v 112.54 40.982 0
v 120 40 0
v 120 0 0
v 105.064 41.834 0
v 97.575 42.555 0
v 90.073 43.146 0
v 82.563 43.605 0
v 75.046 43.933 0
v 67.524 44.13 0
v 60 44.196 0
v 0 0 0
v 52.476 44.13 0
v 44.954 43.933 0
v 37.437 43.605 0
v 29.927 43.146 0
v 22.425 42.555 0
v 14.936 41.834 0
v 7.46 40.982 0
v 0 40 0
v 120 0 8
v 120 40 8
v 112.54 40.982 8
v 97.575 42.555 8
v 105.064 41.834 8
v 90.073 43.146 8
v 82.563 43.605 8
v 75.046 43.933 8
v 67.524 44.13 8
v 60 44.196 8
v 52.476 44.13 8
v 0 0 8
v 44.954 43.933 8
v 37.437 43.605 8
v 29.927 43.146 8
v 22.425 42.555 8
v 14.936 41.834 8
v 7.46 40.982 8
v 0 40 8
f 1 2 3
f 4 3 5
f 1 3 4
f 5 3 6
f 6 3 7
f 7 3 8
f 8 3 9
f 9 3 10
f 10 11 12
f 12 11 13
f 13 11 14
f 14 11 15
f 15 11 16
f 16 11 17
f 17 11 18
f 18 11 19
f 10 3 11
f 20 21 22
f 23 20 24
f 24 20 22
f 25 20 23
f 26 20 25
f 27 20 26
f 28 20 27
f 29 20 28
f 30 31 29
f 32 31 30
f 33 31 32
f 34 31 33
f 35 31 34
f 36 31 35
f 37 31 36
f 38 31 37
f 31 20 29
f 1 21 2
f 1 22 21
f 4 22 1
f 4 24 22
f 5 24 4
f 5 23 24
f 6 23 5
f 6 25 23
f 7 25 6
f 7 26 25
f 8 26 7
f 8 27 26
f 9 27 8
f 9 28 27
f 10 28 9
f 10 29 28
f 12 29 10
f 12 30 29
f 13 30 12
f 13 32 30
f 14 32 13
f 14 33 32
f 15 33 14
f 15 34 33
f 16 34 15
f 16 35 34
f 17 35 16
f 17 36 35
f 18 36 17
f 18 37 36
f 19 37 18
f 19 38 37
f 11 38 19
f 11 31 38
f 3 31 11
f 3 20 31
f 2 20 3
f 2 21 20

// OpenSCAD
$fn = 32;

// ----------------------------------------------------------------------
// Arc profile plate: crown, 19 points
// ----------------------------------------------------------------------

// --- parameters (mm) ---
bar_l = 120;              // bar length, X
bar_w = 40;               // bar height at the ends, Y
arc_r = 431.12;           // radius of the crown arc
arc_angle = 16;           // crown arc angle, degrees
crown_rise = 4.2;         // rise of the crown over the ends
arc_step = 1;             // sampling step of the crown arc, degrees
plate_t = 8;              // plate thickness, Z
fit_tol = 0.05;           // declared fit tolerance (prompt contract)
free_tol = 0.2;           // declared free tolerance (prompt contract)

bbox_y = bar_w + crown_rise;  // full height with the crown

profile = [[120, 40], [112.54, 40.982], [105.064, 41.834], [97.575, 42.555], [90.073, 43.146], [82.563, 43.605], [75.046, 43.933], [67.524, 44.13], [60, 44.196], [52.476, 44.13], [44.954, 43.933], [37.437, 43.605], [29.927, 43.146], [22.425, 42.555], [14.936, 41.834], [7.46, 40.982], [0, 40], [0, 0], [120, 0]];  // primary outline, 19 points, counter clockwise

// --- the one profile operation ---
linear_extrude(height = plate_t) polygon(points = profile);
